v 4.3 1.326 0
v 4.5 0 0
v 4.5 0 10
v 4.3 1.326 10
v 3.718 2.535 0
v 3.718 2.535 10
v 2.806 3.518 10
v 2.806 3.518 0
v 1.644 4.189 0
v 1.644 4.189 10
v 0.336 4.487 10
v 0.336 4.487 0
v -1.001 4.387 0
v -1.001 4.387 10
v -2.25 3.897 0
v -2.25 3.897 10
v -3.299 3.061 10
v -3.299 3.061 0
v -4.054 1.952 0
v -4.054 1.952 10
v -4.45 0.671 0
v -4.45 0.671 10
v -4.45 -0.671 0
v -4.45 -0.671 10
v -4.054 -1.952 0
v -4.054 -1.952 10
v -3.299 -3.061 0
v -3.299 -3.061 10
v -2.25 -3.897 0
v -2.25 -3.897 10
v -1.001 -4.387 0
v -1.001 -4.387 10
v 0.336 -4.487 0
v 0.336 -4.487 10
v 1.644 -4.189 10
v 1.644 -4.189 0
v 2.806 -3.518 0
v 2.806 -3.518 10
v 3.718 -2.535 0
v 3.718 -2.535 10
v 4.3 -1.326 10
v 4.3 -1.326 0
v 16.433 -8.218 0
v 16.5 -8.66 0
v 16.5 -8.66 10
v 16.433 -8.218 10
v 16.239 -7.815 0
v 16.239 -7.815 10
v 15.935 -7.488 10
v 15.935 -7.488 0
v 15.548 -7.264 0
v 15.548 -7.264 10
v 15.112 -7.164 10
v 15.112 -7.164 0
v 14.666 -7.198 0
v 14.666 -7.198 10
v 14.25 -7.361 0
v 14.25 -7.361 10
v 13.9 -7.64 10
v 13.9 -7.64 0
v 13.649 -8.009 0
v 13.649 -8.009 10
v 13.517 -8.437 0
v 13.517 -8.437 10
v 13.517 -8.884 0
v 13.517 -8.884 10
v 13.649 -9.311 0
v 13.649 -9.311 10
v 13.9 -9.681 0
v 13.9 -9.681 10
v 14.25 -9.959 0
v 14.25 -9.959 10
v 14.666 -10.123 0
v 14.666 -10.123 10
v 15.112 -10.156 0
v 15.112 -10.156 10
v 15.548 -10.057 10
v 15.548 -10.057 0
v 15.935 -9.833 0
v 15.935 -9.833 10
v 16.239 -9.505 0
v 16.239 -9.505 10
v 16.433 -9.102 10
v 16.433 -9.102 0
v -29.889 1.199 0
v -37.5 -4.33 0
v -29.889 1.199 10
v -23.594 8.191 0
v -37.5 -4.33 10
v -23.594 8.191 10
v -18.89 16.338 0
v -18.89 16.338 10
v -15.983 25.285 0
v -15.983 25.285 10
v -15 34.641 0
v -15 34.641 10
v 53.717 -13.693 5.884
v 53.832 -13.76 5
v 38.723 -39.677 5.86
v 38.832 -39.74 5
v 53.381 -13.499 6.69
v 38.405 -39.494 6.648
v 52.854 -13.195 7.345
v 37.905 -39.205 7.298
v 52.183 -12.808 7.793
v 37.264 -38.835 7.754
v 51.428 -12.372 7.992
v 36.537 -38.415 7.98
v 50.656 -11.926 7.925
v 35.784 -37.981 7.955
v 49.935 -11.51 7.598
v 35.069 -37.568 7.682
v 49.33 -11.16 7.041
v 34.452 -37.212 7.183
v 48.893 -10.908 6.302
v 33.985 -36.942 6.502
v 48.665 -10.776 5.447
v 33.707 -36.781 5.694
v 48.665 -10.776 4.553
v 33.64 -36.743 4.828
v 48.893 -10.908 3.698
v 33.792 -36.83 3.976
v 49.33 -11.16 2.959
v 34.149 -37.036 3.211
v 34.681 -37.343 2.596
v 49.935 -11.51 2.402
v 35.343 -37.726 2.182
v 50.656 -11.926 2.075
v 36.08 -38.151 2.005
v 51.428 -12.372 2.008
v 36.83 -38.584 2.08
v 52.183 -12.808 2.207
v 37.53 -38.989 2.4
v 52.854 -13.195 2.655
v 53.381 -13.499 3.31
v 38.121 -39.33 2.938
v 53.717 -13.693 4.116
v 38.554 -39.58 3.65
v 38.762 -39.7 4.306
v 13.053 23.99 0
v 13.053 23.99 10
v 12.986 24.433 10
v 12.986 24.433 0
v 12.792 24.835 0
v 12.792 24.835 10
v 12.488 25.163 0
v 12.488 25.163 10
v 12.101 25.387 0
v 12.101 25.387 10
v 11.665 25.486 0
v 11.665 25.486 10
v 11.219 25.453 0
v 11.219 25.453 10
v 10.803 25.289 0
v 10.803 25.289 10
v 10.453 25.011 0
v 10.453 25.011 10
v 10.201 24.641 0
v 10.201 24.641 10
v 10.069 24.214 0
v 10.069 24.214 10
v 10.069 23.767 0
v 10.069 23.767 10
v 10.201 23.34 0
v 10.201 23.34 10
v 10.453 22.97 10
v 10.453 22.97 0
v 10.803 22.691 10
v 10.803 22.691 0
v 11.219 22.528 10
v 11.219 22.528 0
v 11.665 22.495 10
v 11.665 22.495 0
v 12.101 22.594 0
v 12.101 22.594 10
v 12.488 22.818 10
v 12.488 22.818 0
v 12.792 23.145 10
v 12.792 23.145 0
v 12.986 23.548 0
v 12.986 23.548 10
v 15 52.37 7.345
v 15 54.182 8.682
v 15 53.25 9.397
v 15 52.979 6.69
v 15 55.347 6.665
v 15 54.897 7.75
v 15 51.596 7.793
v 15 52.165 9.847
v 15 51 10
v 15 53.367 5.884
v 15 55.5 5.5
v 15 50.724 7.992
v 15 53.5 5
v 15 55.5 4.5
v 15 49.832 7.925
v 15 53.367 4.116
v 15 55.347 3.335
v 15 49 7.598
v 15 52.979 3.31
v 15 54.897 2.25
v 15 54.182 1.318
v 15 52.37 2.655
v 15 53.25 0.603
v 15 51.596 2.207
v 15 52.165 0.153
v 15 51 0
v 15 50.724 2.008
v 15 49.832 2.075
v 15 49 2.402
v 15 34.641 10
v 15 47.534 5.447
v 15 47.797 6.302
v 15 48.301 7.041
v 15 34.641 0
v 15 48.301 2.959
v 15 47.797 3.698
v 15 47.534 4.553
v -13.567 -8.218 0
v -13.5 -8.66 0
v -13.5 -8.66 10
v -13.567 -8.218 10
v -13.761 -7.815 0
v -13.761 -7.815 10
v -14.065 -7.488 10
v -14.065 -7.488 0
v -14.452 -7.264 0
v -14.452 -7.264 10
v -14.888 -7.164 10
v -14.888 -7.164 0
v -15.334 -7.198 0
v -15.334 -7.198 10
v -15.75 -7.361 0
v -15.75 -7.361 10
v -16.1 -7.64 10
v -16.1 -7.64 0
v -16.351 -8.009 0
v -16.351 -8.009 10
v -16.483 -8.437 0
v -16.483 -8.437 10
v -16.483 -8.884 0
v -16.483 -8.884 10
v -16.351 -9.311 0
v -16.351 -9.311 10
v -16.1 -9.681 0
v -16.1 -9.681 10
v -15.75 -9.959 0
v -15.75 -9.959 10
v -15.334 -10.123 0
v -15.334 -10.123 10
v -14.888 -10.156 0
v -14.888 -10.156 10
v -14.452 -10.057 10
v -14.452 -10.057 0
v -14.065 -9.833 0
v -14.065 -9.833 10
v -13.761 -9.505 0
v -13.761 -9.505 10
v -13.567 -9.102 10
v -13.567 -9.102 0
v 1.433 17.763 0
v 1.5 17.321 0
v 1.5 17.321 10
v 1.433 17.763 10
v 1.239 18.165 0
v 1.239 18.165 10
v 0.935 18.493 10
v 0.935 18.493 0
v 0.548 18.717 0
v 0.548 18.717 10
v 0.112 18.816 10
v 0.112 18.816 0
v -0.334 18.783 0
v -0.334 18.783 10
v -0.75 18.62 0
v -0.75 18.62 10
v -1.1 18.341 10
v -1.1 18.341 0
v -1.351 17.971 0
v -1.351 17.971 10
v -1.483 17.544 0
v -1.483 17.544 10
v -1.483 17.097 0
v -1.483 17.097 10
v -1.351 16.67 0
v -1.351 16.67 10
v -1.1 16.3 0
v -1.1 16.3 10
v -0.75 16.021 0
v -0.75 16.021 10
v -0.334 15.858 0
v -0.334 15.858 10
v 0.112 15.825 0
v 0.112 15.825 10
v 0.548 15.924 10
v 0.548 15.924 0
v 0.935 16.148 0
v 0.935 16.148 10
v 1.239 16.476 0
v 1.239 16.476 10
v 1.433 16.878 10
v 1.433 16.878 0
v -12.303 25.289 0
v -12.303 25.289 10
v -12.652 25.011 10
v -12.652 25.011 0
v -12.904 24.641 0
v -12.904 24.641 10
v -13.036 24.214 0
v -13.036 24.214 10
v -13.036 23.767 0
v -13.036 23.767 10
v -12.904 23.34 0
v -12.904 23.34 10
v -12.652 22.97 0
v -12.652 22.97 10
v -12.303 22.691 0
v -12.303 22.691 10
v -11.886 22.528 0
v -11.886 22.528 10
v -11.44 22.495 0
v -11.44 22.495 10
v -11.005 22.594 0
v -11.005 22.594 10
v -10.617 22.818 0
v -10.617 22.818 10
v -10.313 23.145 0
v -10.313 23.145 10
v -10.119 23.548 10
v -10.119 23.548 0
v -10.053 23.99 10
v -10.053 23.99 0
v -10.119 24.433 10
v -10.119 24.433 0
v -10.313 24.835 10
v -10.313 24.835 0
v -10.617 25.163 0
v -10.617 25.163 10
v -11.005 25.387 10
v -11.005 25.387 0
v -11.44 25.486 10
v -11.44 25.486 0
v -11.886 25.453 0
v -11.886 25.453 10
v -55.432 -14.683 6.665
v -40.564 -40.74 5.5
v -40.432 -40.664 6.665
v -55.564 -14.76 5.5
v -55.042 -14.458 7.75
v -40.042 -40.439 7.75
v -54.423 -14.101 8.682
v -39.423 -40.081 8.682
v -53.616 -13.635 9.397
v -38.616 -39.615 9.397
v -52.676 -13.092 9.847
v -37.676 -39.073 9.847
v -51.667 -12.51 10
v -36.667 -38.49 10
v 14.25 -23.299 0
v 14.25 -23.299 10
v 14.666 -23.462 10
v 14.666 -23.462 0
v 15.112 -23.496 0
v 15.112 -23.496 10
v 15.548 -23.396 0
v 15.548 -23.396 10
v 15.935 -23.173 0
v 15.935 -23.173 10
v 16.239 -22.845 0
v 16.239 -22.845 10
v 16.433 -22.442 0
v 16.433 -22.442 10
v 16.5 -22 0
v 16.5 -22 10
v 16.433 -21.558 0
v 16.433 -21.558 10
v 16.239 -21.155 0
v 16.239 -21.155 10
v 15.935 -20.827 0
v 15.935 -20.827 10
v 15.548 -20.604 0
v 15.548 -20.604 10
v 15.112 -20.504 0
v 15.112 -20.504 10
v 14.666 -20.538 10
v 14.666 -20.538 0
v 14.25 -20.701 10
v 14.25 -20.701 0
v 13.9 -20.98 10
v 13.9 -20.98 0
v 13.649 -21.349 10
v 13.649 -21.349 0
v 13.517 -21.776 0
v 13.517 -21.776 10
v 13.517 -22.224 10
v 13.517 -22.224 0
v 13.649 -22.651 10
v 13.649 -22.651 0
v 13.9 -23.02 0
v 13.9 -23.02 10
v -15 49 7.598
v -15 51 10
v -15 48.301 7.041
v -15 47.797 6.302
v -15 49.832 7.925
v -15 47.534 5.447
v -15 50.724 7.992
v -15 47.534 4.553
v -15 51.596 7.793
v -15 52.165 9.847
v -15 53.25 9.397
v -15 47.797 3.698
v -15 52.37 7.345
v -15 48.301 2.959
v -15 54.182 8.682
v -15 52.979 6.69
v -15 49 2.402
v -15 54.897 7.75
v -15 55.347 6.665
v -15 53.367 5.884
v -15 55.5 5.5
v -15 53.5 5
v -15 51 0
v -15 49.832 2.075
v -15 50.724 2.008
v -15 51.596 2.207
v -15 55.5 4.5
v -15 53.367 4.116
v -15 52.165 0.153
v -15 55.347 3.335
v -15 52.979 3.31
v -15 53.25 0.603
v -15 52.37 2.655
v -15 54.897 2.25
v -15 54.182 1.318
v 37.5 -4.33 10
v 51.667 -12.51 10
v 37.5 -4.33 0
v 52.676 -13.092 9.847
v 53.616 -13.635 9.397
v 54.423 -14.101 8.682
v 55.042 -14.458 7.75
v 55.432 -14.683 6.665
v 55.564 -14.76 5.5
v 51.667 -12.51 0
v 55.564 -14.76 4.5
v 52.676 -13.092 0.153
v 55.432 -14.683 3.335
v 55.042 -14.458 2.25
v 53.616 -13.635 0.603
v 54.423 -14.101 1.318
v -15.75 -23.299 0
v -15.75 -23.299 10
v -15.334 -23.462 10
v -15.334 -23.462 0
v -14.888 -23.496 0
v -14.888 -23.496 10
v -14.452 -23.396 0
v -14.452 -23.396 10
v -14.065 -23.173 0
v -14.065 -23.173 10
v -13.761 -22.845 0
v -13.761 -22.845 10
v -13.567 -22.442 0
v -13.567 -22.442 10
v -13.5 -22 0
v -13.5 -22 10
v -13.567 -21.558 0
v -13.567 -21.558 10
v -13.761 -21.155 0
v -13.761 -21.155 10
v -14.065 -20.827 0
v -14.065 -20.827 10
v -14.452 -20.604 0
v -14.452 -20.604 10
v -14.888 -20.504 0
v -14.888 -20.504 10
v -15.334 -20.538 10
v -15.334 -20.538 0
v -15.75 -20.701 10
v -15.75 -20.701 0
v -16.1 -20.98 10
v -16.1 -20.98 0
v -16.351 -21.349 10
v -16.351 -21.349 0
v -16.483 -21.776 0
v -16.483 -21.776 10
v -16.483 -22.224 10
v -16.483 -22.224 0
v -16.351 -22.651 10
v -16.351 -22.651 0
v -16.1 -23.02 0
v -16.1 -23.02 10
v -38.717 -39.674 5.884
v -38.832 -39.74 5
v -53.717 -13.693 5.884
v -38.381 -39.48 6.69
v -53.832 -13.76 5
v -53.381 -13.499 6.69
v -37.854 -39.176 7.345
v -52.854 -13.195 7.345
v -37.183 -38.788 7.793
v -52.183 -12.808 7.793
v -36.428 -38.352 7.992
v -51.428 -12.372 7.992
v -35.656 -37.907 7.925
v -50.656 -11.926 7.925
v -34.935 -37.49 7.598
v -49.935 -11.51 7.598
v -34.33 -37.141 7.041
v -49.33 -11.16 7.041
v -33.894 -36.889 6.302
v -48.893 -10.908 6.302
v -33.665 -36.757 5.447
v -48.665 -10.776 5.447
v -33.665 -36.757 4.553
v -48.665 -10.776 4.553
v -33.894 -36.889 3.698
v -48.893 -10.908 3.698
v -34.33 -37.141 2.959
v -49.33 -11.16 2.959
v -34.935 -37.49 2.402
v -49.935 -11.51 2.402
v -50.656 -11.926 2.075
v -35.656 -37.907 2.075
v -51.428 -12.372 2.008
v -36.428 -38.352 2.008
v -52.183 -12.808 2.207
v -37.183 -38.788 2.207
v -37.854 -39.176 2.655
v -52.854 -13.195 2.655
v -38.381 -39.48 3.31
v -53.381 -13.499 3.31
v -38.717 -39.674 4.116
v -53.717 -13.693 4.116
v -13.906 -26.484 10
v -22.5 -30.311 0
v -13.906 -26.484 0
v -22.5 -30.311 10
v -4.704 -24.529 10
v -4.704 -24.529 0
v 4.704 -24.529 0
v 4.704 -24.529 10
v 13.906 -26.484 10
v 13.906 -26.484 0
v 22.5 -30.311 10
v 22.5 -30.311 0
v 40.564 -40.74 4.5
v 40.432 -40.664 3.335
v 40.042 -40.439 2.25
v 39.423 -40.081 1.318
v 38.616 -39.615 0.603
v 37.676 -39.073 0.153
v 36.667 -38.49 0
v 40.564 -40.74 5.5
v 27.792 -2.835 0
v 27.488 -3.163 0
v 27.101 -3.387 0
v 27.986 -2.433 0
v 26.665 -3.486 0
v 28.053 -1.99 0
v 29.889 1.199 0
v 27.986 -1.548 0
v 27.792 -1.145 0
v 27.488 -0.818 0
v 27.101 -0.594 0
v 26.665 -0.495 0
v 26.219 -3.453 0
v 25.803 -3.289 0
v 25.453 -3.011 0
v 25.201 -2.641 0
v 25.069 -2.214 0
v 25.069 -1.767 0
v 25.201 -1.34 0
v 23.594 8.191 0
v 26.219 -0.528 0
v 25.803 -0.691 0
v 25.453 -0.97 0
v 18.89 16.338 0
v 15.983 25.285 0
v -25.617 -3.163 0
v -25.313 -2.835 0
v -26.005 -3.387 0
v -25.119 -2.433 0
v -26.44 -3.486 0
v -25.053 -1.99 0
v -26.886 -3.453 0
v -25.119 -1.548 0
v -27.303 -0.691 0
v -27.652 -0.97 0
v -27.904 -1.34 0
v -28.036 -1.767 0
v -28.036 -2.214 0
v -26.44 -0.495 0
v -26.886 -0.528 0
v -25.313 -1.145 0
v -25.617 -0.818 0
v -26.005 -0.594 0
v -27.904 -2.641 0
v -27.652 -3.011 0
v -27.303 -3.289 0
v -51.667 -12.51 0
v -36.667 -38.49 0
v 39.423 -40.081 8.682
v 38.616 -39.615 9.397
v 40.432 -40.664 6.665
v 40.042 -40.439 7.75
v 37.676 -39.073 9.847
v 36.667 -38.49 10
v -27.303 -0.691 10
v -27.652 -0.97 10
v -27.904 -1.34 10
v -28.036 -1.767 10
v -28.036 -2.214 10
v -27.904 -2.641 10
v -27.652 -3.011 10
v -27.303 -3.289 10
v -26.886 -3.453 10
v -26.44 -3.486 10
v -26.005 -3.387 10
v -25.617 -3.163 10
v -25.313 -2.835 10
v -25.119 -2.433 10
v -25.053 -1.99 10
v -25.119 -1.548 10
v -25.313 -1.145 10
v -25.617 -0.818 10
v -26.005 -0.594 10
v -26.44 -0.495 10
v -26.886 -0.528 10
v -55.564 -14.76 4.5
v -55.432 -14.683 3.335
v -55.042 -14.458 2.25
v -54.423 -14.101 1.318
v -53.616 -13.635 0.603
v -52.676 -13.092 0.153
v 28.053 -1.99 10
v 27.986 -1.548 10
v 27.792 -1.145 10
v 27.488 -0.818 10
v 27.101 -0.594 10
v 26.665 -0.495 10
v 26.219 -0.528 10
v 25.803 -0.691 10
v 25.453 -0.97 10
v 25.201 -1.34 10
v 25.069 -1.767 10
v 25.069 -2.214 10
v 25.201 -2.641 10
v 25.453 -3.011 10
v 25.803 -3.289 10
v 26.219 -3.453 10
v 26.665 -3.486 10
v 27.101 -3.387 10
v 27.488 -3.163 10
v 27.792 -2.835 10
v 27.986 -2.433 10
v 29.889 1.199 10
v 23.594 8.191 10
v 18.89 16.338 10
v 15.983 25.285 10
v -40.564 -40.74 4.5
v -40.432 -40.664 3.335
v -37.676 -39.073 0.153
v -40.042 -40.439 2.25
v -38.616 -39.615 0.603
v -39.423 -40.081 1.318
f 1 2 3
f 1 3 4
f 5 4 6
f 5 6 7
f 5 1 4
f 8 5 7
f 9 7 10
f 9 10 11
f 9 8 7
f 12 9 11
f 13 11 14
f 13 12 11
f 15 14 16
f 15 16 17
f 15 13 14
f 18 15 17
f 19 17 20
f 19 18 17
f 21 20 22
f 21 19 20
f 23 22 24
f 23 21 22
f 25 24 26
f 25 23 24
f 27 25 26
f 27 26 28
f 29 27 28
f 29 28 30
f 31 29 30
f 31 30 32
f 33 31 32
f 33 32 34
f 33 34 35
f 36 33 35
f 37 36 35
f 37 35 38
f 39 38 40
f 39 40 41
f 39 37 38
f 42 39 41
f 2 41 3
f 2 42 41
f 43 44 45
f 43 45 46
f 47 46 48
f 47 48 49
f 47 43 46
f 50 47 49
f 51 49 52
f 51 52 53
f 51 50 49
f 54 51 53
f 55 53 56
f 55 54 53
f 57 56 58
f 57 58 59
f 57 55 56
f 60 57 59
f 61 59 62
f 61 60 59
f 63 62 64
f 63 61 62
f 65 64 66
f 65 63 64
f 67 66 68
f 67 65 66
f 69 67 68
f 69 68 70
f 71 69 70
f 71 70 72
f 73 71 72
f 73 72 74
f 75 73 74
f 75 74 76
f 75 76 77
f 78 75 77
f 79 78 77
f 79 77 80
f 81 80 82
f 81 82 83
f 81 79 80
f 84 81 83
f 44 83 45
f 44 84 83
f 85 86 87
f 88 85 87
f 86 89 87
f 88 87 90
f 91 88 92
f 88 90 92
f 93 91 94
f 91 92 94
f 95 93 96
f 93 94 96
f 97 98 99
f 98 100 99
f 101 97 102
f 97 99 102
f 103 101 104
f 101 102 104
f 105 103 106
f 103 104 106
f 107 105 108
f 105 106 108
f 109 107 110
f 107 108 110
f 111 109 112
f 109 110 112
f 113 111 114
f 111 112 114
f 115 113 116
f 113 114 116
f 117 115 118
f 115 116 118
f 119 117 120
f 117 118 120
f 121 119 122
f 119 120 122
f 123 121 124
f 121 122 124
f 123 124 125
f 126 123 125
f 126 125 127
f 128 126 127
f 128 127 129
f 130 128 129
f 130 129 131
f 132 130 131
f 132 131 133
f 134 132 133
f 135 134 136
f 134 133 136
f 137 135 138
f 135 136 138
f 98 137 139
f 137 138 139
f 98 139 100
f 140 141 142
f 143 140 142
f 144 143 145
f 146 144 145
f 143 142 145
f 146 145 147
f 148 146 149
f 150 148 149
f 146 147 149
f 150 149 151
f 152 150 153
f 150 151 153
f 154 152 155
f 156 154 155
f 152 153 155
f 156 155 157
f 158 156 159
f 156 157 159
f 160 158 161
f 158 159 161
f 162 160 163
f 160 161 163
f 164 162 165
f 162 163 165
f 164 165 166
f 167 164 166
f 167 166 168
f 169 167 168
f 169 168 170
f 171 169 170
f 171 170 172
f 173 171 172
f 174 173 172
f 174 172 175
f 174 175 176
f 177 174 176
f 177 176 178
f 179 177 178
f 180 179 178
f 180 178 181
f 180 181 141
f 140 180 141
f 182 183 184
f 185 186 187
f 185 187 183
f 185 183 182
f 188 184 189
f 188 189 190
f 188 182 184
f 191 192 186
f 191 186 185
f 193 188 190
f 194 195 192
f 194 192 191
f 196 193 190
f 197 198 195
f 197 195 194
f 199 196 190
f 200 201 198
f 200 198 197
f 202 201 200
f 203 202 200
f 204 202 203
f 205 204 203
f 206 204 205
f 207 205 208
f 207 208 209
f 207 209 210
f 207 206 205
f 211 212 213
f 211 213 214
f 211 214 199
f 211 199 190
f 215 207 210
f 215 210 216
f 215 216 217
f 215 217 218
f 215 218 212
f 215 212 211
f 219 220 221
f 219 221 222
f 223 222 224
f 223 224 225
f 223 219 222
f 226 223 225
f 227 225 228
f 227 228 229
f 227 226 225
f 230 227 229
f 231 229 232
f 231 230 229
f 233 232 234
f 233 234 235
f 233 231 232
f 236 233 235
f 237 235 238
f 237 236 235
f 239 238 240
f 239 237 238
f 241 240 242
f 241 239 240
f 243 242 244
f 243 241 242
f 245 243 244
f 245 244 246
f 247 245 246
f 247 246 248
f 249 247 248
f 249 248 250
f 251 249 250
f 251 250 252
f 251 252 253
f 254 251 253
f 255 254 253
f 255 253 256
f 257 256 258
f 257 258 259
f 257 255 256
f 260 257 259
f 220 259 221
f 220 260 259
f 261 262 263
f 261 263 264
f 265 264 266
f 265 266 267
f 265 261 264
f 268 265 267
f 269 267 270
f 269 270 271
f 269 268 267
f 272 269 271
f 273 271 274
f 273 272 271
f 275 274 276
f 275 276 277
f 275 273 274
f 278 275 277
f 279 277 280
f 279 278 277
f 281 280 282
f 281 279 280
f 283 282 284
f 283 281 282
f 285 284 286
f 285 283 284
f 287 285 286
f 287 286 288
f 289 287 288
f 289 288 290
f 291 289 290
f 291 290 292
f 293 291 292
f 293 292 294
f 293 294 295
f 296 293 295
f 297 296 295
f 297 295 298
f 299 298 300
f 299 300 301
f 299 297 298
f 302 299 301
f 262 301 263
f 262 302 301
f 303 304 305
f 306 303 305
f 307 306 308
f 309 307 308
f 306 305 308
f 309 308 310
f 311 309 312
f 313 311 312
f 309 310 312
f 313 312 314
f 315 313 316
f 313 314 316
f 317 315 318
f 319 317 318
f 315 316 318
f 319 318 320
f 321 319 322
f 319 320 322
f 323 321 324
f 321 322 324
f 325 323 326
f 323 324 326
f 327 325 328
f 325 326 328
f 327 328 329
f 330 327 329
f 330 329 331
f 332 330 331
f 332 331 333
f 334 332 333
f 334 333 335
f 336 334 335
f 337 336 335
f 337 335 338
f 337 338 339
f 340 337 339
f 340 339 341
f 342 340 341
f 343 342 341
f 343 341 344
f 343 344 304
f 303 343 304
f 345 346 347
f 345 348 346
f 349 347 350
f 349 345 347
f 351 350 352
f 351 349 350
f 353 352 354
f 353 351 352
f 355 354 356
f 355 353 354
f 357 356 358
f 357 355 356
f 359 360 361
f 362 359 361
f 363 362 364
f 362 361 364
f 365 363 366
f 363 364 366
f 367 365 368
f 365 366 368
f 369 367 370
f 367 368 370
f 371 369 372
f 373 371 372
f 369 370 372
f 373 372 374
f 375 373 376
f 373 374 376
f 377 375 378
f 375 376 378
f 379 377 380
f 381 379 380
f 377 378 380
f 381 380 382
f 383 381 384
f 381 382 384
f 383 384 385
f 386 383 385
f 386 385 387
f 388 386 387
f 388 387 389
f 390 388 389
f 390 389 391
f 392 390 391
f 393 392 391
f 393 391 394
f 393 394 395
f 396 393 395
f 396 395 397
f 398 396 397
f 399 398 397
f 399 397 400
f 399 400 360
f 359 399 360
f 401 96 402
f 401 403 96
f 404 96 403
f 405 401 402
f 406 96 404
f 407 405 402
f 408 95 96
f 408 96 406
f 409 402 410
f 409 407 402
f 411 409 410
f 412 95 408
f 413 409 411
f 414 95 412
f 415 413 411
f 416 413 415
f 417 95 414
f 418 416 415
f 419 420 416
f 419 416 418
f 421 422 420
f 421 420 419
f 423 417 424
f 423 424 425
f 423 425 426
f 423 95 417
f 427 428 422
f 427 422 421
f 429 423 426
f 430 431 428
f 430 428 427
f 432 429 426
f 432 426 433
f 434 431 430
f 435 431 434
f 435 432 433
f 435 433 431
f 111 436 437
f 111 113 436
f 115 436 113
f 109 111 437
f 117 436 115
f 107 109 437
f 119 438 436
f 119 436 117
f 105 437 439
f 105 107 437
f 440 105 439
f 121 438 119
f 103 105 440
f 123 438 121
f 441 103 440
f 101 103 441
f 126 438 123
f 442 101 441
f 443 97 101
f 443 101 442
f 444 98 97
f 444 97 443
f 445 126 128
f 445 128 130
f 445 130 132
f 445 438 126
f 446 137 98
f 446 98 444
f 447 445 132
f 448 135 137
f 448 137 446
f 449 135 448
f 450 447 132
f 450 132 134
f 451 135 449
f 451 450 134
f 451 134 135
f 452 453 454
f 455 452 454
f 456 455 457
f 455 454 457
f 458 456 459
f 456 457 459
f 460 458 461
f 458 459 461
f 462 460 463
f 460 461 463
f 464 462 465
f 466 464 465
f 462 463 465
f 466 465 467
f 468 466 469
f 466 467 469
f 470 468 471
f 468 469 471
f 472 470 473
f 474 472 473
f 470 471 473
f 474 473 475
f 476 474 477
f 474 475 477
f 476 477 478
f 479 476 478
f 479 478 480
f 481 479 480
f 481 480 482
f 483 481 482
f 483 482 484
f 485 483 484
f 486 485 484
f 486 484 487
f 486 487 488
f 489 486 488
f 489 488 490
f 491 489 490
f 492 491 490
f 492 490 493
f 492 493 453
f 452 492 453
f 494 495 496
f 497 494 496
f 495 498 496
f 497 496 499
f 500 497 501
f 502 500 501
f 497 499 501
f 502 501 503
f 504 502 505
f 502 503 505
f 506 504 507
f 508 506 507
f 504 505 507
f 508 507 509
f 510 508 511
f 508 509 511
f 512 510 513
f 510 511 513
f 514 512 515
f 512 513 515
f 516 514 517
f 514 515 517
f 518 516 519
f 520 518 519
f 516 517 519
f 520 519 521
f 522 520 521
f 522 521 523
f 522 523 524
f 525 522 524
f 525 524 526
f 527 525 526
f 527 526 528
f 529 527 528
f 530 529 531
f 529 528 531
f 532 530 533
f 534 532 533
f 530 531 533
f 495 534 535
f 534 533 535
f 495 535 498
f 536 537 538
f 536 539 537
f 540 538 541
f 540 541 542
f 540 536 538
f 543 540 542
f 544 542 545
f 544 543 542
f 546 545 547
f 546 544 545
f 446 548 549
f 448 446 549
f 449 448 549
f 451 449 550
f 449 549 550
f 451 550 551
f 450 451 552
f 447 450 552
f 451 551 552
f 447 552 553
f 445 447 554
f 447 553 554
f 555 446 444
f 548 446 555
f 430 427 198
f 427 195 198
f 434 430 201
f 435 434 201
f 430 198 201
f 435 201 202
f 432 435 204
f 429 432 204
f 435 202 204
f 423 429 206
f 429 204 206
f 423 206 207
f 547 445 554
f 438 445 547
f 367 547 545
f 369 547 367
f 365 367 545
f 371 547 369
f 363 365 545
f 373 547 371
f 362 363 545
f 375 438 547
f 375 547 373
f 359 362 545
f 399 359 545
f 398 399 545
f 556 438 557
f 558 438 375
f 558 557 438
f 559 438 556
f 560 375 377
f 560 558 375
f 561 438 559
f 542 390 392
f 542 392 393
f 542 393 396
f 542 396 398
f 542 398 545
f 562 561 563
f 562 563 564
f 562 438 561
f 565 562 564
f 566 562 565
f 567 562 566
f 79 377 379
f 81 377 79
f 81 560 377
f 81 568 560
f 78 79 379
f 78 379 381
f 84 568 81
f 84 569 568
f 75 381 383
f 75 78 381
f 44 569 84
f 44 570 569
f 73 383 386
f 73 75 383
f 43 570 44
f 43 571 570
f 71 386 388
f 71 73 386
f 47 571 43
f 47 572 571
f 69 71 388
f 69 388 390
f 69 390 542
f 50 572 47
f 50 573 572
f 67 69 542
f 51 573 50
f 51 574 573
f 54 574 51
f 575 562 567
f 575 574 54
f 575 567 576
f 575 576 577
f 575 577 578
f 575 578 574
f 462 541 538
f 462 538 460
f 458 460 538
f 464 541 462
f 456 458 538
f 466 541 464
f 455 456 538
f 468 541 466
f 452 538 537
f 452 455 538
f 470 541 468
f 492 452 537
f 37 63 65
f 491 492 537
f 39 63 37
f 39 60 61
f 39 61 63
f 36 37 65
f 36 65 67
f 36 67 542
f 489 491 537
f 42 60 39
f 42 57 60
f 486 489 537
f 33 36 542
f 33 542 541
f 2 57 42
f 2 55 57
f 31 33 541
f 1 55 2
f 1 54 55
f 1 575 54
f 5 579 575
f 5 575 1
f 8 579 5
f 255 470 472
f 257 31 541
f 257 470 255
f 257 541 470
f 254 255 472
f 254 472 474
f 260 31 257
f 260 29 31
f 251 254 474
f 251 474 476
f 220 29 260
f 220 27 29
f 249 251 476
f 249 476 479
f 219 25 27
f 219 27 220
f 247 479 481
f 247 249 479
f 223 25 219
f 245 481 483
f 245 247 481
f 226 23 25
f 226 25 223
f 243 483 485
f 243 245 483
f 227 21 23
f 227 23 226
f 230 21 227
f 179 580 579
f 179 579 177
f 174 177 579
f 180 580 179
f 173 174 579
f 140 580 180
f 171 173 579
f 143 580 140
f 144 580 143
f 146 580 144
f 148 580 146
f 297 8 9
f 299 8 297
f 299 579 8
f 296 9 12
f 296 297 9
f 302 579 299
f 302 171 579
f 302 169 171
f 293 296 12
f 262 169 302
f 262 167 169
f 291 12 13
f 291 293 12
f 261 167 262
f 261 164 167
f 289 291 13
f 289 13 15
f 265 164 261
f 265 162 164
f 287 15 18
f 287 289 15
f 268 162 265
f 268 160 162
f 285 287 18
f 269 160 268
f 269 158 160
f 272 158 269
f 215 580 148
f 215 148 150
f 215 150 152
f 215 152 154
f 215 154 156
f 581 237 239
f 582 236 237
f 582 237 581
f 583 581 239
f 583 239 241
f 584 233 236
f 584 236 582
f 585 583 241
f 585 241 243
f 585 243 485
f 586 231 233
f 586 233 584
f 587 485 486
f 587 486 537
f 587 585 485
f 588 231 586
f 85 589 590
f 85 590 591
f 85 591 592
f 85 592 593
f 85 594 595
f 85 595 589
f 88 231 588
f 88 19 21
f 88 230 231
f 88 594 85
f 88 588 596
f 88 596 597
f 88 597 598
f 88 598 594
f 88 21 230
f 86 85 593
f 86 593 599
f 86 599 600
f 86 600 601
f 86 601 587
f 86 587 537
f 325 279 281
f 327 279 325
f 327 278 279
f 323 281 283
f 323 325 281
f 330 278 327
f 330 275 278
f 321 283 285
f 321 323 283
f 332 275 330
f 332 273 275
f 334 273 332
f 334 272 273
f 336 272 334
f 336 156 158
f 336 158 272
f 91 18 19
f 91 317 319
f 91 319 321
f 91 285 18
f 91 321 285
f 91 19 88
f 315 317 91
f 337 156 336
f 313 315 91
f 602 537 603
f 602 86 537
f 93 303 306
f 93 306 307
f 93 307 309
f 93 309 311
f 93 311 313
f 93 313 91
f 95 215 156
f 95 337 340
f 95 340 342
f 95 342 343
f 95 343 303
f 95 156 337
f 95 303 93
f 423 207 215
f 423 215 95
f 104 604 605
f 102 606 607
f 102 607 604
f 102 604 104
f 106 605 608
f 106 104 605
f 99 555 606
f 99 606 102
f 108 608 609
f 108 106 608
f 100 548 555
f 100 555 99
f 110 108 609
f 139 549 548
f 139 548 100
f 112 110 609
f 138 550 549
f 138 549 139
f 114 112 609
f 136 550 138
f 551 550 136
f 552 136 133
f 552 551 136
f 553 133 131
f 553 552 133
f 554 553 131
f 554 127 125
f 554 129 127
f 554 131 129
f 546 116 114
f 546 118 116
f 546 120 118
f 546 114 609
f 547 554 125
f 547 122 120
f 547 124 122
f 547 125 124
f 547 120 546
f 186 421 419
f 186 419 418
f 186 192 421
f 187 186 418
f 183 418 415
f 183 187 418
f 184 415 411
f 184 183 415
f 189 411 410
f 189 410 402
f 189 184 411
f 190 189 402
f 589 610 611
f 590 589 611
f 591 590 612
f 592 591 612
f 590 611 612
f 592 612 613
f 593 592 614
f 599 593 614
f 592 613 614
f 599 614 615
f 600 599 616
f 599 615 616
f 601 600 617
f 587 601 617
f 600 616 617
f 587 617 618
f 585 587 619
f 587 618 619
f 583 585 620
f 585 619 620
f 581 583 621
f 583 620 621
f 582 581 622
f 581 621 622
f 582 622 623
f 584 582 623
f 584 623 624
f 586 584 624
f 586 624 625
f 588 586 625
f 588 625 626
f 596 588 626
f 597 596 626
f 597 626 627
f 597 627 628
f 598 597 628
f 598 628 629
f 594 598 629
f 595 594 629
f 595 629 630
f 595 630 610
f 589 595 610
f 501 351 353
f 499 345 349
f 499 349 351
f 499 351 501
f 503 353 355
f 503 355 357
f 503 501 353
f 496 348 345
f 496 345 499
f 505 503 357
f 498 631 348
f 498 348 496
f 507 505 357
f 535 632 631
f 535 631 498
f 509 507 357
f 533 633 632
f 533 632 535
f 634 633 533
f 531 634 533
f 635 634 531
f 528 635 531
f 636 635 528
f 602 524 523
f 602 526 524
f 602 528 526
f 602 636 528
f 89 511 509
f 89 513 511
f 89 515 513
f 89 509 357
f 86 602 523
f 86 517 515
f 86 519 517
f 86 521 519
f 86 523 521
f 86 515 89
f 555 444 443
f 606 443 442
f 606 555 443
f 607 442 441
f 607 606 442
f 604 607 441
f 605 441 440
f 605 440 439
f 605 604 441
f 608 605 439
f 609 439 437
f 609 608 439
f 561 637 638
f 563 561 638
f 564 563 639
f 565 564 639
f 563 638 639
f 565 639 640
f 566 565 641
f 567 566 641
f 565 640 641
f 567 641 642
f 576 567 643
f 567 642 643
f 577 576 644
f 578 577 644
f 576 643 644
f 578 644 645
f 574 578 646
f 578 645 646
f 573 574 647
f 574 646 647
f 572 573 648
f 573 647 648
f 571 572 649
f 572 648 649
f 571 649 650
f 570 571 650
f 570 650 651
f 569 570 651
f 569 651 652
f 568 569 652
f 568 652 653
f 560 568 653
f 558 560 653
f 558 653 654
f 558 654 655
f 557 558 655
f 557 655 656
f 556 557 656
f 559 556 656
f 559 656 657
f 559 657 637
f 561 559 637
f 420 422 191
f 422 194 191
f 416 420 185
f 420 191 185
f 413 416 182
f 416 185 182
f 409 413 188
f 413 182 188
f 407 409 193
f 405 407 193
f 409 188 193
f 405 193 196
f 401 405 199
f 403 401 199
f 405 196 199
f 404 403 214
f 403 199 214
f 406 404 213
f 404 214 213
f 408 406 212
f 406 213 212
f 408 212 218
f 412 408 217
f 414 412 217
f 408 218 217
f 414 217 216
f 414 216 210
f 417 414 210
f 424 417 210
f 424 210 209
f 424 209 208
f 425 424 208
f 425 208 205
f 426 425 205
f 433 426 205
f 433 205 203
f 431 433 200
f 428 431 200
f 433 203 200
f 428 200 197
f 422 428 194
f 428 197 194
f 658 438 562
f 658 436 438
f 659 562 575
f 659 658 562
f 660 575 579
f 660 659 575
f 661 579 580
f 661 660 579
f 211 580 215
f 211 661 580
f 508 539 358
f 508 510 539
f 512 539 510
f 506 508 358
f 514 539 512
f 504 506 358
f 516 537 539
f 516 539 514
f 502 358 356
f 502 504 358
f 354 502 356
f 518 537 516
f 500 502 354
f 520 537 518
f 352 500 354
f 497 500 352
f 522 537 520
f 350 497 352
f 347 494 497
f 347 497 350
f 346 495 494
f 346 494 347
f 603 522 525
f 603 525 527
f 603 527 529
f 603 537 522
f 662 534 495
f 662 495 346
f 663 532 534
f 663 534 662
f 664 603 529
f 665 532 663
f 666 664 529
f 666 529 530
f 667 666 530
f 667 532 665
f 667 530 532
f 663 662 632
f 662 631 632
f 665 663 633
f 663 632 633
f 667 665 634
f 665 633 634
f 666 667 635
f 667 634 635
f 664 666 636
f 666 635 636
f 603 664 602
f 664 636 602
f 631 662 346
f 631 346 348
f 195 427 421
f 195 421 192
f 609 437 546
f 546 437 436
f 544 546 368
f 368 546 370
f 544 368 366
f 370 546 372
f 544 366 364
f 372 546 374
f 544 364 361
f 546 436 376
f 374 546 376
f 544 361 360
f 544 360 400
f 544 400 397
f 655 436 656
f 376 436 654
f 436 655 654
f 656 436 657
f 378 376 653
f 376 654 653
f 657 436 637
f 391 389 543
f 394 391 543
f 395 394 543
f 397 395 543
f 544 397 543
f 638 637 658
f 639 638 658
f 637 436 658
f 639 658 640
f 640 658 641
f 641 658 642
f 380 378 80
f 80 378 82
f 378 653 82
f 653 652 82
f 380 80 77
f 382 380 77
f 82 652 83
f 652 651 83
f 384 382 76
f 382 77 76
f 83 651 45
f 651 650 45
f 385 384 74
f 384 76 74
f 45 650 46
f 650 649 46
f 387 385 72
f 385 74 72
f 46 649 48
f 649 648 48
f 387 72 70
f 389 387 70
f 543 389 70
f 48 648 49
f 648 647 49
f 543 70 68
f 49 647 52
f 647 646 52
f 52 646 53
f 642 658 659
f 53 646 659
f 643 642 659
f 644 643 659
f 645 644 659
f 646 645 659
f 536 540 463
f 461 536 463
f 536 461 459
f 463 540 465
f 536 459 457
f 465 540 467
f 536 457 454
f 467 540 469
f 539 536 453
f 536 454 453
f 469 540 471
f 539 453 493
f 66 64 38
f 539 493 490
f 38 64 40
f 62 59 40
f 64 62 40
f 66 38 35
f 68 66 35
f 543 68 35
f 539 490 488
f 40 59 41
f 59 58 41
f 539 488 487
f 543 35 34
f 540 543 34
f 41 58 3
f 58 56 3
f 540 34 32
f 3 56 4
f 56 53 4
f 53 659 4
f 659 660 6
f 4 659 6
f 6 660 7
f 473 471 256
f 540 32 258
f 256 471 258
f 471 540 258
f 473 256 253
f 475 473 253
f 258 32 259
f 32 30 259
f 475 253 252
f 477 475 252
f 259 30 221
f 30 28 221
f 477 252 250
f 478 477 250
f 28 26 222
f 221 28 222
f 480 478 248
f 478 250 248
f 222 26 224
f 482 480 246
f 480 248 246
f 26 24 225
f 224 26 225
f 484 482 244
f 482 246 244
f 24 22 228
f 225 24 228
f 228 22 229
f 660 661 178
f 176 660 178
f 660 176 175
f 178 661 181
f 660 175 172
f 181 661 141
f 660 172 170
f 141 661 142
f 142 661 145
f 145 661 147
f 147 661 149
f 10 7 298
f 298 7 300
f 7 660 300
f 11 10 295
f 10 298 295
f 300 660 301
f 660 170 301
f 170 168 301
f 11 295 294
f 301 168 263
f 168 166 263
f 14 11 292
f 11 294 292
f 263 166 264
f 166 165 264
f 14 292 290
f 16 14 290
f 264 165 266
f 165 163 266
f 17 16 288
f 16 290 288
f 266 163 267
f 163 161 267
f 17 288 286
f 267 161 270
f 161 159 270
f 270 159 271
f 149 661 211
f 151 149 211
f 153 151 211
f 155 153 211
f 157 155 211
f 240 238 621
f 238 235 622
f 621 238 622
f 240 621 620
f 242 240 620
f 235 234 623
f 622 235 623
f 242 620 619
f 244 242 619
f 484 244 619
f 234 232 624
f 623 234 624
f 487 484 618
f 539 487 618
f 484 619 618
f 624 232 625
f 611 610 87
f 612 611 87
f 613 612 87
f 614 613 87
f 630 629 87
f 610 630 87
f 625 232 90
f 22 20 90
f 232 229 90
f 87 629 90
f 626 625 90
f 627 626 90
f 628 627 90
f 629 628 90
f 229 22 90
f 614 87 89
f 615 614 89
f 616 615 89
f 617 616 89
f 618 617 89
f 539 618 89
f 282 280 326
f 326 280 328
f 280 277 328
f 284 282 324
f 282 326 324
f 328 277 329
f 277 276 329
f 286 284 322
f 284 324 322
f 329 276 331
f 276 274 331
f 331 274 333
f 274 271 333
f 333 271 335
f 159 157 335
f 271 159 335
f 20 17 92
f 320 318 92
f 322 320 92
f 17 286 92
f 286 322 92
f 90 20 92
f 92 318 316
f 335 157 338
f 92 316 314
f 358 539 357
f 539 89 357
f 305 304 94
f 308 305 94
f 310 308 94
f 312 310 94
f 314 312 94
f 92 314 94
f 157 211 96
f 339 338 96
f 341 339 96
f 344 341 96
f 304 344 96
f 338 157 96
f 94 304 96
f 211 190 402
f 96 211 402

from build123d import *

# Parameters (mm, degrees)
SKETCH021_R           = 4.5
SKETCH021_R_2         = 1.5
PAD011_DEPTH          = 10
FILLET_R              = 4.5
SKETCH022_R           = 3
POCKET004_DEPTH       = 350.264033
POCKET004_DEPTH_BACK  = 350.264033
POLARPATTERN001_COUNT = 3
FILLET001_R           = 45
SKETCH025_R           = 1.5
POCKET005_DEPTH       = 304.699646
POLARPATTERN002_COUNT = 3


with BuildPart() as part:
    # Sketch021 → Pad011 (new body)
    with BuildSketch(Plane.XY):
        Polygon((-40.564433, -40.740341), (-55.564387, -14.759659), (-14.999954, 8.660227), (-14.999954, 55.5), (14.999954, 55.5), (14.999954, 8.660227), (55.564387, -14.759659), (40.564387, -40.740421), (0, -17.320455), align=None)
        Circle(SKETCH021_R, mode=Mode.SUBTRACT)
        with Locations((0, 17.320508)):
            Circle(SKETCH021_R_2, mode=Mode.SUBTRACT)
        with Locations((15, -8.660254)):
            Circle(SKETCH021_R_2, mode=Mode.SUBTRACT)
        with Locations((-15, -8.660254)):
            Circle(SKETCH021_R_2, mode=Mode.SUBTRACT)
    extrude(amount=PAD011_DEPTH)

    # Fillet
    fillet_edges = [part.edges().sort_by_distance(p)[0] for p in [
        (0, 55.5, 0),
        (48.064387, -27.75004, 0),
        (-48.06441, -27.75, 0),
        (48.064387, -27.75004, 10),
        (-48.06441, -27.75, 10),
        (0, 55.5, 10),
    ]]
    fillet(fillet_edges, radius=FILLET_R)

    # Sketch022 → Pocket004 (cut, two sides)
    with BuildSketch(Plane.YZ) as pocket004_sk:
        with Locations((50.5, 5)):
            Circle(SKETCH022_R)
    pocket004 = extrude(amount=-POCKET004_DEPTH, mode=Mode.SUBTRACT) + extrude(pocket004_sk.sketch, amount=POCKET004_DEPTH_BACK, mode=Mode.SUBTRACT)

    # PolarPattern001: Pocket004 ×3 about axis
    polarpattern001_axis = Axis((0, 0, 0), (0, 0, 1))
    for i in range(1, POLARPATTERN001_COUNT):
        add(pocket004.rotate(polarpattern001_axis, i * 360 / POLARPATTERN001_COUNT), mode=Mode.SUBTRACT)

    # Fillet001
    fillet001_edges = [part.edges().sort_by_distance(p)[0] for p in [
        (14.999954, 8.660227, 5),
        (-14.999954, 8.660227, 5),
        (0, -17.320455, 5),
    ]]
    fillet(fillet001_edges, radius=FILLET001_R)

    # Sketch025 (on Face5 of Fillet001) → Pocket005 (cut, through all)
    with BuildSketch(Plane.XY.offset(10)):
        with Locations((11.552559, 23.990381)):
            Circle(SKETCH025_R)
        with Locations((26.552559, -1.990381)):
            Circle(SKETCH025_R)
    pocket005 = extrude(amount=-POCKET005_DEPTH, mode=Mode.SUBTRACT)

    # PolarPattern002: Pocket005 ×3 about axis
    polarpattern002_axis = Axis((0, 0, 10), (0, 0, 1))
    for i in range(1, POLARPATTERN002_COUNT):
        add(pocket005.rotate(polarpattern002_axis, i * 360 / POLARPATTERN002_COUNT), mode=Mode.SUBTRACT)


solid = part.part
